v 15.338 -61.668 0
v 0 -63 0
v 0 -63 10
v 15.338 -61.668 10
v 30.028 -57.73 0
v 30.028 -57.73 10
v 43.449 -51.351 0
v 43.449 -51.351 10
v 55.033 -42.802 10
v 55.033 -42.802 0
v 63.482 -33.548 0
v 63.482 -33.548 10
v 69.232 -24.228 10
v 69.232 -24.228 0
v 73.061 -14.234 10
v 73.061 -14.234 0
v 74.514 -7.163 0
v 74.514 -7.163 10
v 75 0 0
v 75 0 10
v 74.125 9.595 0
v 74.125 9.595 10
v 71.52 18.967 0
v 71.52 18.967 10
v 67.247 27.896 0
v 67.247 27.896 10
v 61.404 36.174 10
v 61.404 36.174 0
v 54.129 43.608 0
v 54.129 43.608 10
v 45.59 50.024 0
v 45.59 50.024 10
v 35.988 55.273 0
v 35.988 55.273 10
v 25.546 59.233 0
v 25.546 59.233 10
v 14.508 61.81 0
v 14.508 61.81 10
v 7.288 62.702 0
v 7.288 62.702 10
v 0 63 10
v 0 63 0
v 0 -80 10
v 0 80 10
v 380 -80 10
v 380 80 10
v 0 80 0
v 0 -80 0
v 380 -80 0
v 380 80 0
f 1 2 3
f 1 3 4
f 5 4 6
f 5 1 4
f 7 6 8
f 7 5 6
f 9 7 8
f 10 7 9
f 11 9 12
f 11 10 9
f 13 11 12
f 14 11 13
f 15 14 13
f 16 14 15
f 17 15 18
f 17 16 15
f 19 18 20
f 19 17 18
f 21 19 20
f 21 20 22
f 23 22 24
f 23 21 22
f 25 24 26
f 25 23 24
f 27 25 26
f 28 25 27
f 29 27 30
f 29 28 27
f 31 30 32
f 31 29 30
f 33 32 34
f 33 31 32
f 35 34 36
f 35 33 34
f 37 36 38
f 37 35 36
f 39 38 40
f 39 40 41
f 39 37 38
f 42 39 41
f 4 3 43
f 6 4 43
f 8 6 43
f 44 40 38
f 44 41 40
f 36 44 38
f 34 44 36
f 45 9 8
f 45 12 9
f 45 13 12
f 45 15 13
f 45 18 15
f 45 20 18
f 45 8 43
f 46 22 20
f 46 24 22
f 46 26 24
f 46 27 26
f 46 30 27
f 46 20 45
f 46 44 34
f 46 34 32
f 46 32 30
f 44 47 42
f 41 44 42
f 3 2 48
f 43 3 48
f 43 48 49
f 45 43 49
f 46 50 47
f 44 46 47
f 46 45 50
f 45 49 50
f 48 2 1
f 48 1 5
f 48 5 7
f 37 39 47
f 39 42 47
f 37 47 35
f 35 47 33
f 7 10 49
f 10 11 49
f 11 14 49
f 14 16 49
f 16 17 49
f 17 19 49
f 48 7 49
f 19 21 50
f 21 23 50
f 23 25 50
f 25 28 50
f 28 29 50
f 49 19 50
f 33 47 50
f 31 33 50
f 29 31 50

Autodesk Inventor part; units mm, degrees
ref_plane "YZ Plane" through (0, 0, 0) normal (1, 0, 0) x (0, 1, 0)
ref_plane "XZ Plane" through (0, 0, 0) normal (0, 1, 0) x (-1, 0, 0)
ref_plane "XY Plane" through (0, 0, 0) normal (0, 0, 1) x (1, 0, 0)
sketch "Sketch1" plane through (0, 0, 0) normal (0, 0, 1) x (1, 0, 0)
  ellipse E0 centre (0, 0) end of major axis (75, 0) minor radius 63
  line L0 (0, -63) -> (0, -80)
  line L1 (0, -80) -> (380, -80)
  line L2 (380, -80) -> (380, 80)
  line L3 (380, 80) -> (0, 80)
  line L4 (0, 80) -> (0, 63)
  line L5 (0, 0) -> (380, 0) construction
  point P0 (0, 71.5)
  dimension "d12" = 75
  dimension "d13" = 63
  dimension "d14" = 160
  dimension "d15" = 380
extrude "Plate1" add sketch "Sketch1" along normal blind 10 contours E0 L4 L3 L2 L1 L0
equation "\"d16\" = Thickness"
equation "\"BendReliefDepth\" = 0.5 * Thickness"
equation "\"Thickness\" = 10"
properties part number "NVPH-344 feeder hose 1"
